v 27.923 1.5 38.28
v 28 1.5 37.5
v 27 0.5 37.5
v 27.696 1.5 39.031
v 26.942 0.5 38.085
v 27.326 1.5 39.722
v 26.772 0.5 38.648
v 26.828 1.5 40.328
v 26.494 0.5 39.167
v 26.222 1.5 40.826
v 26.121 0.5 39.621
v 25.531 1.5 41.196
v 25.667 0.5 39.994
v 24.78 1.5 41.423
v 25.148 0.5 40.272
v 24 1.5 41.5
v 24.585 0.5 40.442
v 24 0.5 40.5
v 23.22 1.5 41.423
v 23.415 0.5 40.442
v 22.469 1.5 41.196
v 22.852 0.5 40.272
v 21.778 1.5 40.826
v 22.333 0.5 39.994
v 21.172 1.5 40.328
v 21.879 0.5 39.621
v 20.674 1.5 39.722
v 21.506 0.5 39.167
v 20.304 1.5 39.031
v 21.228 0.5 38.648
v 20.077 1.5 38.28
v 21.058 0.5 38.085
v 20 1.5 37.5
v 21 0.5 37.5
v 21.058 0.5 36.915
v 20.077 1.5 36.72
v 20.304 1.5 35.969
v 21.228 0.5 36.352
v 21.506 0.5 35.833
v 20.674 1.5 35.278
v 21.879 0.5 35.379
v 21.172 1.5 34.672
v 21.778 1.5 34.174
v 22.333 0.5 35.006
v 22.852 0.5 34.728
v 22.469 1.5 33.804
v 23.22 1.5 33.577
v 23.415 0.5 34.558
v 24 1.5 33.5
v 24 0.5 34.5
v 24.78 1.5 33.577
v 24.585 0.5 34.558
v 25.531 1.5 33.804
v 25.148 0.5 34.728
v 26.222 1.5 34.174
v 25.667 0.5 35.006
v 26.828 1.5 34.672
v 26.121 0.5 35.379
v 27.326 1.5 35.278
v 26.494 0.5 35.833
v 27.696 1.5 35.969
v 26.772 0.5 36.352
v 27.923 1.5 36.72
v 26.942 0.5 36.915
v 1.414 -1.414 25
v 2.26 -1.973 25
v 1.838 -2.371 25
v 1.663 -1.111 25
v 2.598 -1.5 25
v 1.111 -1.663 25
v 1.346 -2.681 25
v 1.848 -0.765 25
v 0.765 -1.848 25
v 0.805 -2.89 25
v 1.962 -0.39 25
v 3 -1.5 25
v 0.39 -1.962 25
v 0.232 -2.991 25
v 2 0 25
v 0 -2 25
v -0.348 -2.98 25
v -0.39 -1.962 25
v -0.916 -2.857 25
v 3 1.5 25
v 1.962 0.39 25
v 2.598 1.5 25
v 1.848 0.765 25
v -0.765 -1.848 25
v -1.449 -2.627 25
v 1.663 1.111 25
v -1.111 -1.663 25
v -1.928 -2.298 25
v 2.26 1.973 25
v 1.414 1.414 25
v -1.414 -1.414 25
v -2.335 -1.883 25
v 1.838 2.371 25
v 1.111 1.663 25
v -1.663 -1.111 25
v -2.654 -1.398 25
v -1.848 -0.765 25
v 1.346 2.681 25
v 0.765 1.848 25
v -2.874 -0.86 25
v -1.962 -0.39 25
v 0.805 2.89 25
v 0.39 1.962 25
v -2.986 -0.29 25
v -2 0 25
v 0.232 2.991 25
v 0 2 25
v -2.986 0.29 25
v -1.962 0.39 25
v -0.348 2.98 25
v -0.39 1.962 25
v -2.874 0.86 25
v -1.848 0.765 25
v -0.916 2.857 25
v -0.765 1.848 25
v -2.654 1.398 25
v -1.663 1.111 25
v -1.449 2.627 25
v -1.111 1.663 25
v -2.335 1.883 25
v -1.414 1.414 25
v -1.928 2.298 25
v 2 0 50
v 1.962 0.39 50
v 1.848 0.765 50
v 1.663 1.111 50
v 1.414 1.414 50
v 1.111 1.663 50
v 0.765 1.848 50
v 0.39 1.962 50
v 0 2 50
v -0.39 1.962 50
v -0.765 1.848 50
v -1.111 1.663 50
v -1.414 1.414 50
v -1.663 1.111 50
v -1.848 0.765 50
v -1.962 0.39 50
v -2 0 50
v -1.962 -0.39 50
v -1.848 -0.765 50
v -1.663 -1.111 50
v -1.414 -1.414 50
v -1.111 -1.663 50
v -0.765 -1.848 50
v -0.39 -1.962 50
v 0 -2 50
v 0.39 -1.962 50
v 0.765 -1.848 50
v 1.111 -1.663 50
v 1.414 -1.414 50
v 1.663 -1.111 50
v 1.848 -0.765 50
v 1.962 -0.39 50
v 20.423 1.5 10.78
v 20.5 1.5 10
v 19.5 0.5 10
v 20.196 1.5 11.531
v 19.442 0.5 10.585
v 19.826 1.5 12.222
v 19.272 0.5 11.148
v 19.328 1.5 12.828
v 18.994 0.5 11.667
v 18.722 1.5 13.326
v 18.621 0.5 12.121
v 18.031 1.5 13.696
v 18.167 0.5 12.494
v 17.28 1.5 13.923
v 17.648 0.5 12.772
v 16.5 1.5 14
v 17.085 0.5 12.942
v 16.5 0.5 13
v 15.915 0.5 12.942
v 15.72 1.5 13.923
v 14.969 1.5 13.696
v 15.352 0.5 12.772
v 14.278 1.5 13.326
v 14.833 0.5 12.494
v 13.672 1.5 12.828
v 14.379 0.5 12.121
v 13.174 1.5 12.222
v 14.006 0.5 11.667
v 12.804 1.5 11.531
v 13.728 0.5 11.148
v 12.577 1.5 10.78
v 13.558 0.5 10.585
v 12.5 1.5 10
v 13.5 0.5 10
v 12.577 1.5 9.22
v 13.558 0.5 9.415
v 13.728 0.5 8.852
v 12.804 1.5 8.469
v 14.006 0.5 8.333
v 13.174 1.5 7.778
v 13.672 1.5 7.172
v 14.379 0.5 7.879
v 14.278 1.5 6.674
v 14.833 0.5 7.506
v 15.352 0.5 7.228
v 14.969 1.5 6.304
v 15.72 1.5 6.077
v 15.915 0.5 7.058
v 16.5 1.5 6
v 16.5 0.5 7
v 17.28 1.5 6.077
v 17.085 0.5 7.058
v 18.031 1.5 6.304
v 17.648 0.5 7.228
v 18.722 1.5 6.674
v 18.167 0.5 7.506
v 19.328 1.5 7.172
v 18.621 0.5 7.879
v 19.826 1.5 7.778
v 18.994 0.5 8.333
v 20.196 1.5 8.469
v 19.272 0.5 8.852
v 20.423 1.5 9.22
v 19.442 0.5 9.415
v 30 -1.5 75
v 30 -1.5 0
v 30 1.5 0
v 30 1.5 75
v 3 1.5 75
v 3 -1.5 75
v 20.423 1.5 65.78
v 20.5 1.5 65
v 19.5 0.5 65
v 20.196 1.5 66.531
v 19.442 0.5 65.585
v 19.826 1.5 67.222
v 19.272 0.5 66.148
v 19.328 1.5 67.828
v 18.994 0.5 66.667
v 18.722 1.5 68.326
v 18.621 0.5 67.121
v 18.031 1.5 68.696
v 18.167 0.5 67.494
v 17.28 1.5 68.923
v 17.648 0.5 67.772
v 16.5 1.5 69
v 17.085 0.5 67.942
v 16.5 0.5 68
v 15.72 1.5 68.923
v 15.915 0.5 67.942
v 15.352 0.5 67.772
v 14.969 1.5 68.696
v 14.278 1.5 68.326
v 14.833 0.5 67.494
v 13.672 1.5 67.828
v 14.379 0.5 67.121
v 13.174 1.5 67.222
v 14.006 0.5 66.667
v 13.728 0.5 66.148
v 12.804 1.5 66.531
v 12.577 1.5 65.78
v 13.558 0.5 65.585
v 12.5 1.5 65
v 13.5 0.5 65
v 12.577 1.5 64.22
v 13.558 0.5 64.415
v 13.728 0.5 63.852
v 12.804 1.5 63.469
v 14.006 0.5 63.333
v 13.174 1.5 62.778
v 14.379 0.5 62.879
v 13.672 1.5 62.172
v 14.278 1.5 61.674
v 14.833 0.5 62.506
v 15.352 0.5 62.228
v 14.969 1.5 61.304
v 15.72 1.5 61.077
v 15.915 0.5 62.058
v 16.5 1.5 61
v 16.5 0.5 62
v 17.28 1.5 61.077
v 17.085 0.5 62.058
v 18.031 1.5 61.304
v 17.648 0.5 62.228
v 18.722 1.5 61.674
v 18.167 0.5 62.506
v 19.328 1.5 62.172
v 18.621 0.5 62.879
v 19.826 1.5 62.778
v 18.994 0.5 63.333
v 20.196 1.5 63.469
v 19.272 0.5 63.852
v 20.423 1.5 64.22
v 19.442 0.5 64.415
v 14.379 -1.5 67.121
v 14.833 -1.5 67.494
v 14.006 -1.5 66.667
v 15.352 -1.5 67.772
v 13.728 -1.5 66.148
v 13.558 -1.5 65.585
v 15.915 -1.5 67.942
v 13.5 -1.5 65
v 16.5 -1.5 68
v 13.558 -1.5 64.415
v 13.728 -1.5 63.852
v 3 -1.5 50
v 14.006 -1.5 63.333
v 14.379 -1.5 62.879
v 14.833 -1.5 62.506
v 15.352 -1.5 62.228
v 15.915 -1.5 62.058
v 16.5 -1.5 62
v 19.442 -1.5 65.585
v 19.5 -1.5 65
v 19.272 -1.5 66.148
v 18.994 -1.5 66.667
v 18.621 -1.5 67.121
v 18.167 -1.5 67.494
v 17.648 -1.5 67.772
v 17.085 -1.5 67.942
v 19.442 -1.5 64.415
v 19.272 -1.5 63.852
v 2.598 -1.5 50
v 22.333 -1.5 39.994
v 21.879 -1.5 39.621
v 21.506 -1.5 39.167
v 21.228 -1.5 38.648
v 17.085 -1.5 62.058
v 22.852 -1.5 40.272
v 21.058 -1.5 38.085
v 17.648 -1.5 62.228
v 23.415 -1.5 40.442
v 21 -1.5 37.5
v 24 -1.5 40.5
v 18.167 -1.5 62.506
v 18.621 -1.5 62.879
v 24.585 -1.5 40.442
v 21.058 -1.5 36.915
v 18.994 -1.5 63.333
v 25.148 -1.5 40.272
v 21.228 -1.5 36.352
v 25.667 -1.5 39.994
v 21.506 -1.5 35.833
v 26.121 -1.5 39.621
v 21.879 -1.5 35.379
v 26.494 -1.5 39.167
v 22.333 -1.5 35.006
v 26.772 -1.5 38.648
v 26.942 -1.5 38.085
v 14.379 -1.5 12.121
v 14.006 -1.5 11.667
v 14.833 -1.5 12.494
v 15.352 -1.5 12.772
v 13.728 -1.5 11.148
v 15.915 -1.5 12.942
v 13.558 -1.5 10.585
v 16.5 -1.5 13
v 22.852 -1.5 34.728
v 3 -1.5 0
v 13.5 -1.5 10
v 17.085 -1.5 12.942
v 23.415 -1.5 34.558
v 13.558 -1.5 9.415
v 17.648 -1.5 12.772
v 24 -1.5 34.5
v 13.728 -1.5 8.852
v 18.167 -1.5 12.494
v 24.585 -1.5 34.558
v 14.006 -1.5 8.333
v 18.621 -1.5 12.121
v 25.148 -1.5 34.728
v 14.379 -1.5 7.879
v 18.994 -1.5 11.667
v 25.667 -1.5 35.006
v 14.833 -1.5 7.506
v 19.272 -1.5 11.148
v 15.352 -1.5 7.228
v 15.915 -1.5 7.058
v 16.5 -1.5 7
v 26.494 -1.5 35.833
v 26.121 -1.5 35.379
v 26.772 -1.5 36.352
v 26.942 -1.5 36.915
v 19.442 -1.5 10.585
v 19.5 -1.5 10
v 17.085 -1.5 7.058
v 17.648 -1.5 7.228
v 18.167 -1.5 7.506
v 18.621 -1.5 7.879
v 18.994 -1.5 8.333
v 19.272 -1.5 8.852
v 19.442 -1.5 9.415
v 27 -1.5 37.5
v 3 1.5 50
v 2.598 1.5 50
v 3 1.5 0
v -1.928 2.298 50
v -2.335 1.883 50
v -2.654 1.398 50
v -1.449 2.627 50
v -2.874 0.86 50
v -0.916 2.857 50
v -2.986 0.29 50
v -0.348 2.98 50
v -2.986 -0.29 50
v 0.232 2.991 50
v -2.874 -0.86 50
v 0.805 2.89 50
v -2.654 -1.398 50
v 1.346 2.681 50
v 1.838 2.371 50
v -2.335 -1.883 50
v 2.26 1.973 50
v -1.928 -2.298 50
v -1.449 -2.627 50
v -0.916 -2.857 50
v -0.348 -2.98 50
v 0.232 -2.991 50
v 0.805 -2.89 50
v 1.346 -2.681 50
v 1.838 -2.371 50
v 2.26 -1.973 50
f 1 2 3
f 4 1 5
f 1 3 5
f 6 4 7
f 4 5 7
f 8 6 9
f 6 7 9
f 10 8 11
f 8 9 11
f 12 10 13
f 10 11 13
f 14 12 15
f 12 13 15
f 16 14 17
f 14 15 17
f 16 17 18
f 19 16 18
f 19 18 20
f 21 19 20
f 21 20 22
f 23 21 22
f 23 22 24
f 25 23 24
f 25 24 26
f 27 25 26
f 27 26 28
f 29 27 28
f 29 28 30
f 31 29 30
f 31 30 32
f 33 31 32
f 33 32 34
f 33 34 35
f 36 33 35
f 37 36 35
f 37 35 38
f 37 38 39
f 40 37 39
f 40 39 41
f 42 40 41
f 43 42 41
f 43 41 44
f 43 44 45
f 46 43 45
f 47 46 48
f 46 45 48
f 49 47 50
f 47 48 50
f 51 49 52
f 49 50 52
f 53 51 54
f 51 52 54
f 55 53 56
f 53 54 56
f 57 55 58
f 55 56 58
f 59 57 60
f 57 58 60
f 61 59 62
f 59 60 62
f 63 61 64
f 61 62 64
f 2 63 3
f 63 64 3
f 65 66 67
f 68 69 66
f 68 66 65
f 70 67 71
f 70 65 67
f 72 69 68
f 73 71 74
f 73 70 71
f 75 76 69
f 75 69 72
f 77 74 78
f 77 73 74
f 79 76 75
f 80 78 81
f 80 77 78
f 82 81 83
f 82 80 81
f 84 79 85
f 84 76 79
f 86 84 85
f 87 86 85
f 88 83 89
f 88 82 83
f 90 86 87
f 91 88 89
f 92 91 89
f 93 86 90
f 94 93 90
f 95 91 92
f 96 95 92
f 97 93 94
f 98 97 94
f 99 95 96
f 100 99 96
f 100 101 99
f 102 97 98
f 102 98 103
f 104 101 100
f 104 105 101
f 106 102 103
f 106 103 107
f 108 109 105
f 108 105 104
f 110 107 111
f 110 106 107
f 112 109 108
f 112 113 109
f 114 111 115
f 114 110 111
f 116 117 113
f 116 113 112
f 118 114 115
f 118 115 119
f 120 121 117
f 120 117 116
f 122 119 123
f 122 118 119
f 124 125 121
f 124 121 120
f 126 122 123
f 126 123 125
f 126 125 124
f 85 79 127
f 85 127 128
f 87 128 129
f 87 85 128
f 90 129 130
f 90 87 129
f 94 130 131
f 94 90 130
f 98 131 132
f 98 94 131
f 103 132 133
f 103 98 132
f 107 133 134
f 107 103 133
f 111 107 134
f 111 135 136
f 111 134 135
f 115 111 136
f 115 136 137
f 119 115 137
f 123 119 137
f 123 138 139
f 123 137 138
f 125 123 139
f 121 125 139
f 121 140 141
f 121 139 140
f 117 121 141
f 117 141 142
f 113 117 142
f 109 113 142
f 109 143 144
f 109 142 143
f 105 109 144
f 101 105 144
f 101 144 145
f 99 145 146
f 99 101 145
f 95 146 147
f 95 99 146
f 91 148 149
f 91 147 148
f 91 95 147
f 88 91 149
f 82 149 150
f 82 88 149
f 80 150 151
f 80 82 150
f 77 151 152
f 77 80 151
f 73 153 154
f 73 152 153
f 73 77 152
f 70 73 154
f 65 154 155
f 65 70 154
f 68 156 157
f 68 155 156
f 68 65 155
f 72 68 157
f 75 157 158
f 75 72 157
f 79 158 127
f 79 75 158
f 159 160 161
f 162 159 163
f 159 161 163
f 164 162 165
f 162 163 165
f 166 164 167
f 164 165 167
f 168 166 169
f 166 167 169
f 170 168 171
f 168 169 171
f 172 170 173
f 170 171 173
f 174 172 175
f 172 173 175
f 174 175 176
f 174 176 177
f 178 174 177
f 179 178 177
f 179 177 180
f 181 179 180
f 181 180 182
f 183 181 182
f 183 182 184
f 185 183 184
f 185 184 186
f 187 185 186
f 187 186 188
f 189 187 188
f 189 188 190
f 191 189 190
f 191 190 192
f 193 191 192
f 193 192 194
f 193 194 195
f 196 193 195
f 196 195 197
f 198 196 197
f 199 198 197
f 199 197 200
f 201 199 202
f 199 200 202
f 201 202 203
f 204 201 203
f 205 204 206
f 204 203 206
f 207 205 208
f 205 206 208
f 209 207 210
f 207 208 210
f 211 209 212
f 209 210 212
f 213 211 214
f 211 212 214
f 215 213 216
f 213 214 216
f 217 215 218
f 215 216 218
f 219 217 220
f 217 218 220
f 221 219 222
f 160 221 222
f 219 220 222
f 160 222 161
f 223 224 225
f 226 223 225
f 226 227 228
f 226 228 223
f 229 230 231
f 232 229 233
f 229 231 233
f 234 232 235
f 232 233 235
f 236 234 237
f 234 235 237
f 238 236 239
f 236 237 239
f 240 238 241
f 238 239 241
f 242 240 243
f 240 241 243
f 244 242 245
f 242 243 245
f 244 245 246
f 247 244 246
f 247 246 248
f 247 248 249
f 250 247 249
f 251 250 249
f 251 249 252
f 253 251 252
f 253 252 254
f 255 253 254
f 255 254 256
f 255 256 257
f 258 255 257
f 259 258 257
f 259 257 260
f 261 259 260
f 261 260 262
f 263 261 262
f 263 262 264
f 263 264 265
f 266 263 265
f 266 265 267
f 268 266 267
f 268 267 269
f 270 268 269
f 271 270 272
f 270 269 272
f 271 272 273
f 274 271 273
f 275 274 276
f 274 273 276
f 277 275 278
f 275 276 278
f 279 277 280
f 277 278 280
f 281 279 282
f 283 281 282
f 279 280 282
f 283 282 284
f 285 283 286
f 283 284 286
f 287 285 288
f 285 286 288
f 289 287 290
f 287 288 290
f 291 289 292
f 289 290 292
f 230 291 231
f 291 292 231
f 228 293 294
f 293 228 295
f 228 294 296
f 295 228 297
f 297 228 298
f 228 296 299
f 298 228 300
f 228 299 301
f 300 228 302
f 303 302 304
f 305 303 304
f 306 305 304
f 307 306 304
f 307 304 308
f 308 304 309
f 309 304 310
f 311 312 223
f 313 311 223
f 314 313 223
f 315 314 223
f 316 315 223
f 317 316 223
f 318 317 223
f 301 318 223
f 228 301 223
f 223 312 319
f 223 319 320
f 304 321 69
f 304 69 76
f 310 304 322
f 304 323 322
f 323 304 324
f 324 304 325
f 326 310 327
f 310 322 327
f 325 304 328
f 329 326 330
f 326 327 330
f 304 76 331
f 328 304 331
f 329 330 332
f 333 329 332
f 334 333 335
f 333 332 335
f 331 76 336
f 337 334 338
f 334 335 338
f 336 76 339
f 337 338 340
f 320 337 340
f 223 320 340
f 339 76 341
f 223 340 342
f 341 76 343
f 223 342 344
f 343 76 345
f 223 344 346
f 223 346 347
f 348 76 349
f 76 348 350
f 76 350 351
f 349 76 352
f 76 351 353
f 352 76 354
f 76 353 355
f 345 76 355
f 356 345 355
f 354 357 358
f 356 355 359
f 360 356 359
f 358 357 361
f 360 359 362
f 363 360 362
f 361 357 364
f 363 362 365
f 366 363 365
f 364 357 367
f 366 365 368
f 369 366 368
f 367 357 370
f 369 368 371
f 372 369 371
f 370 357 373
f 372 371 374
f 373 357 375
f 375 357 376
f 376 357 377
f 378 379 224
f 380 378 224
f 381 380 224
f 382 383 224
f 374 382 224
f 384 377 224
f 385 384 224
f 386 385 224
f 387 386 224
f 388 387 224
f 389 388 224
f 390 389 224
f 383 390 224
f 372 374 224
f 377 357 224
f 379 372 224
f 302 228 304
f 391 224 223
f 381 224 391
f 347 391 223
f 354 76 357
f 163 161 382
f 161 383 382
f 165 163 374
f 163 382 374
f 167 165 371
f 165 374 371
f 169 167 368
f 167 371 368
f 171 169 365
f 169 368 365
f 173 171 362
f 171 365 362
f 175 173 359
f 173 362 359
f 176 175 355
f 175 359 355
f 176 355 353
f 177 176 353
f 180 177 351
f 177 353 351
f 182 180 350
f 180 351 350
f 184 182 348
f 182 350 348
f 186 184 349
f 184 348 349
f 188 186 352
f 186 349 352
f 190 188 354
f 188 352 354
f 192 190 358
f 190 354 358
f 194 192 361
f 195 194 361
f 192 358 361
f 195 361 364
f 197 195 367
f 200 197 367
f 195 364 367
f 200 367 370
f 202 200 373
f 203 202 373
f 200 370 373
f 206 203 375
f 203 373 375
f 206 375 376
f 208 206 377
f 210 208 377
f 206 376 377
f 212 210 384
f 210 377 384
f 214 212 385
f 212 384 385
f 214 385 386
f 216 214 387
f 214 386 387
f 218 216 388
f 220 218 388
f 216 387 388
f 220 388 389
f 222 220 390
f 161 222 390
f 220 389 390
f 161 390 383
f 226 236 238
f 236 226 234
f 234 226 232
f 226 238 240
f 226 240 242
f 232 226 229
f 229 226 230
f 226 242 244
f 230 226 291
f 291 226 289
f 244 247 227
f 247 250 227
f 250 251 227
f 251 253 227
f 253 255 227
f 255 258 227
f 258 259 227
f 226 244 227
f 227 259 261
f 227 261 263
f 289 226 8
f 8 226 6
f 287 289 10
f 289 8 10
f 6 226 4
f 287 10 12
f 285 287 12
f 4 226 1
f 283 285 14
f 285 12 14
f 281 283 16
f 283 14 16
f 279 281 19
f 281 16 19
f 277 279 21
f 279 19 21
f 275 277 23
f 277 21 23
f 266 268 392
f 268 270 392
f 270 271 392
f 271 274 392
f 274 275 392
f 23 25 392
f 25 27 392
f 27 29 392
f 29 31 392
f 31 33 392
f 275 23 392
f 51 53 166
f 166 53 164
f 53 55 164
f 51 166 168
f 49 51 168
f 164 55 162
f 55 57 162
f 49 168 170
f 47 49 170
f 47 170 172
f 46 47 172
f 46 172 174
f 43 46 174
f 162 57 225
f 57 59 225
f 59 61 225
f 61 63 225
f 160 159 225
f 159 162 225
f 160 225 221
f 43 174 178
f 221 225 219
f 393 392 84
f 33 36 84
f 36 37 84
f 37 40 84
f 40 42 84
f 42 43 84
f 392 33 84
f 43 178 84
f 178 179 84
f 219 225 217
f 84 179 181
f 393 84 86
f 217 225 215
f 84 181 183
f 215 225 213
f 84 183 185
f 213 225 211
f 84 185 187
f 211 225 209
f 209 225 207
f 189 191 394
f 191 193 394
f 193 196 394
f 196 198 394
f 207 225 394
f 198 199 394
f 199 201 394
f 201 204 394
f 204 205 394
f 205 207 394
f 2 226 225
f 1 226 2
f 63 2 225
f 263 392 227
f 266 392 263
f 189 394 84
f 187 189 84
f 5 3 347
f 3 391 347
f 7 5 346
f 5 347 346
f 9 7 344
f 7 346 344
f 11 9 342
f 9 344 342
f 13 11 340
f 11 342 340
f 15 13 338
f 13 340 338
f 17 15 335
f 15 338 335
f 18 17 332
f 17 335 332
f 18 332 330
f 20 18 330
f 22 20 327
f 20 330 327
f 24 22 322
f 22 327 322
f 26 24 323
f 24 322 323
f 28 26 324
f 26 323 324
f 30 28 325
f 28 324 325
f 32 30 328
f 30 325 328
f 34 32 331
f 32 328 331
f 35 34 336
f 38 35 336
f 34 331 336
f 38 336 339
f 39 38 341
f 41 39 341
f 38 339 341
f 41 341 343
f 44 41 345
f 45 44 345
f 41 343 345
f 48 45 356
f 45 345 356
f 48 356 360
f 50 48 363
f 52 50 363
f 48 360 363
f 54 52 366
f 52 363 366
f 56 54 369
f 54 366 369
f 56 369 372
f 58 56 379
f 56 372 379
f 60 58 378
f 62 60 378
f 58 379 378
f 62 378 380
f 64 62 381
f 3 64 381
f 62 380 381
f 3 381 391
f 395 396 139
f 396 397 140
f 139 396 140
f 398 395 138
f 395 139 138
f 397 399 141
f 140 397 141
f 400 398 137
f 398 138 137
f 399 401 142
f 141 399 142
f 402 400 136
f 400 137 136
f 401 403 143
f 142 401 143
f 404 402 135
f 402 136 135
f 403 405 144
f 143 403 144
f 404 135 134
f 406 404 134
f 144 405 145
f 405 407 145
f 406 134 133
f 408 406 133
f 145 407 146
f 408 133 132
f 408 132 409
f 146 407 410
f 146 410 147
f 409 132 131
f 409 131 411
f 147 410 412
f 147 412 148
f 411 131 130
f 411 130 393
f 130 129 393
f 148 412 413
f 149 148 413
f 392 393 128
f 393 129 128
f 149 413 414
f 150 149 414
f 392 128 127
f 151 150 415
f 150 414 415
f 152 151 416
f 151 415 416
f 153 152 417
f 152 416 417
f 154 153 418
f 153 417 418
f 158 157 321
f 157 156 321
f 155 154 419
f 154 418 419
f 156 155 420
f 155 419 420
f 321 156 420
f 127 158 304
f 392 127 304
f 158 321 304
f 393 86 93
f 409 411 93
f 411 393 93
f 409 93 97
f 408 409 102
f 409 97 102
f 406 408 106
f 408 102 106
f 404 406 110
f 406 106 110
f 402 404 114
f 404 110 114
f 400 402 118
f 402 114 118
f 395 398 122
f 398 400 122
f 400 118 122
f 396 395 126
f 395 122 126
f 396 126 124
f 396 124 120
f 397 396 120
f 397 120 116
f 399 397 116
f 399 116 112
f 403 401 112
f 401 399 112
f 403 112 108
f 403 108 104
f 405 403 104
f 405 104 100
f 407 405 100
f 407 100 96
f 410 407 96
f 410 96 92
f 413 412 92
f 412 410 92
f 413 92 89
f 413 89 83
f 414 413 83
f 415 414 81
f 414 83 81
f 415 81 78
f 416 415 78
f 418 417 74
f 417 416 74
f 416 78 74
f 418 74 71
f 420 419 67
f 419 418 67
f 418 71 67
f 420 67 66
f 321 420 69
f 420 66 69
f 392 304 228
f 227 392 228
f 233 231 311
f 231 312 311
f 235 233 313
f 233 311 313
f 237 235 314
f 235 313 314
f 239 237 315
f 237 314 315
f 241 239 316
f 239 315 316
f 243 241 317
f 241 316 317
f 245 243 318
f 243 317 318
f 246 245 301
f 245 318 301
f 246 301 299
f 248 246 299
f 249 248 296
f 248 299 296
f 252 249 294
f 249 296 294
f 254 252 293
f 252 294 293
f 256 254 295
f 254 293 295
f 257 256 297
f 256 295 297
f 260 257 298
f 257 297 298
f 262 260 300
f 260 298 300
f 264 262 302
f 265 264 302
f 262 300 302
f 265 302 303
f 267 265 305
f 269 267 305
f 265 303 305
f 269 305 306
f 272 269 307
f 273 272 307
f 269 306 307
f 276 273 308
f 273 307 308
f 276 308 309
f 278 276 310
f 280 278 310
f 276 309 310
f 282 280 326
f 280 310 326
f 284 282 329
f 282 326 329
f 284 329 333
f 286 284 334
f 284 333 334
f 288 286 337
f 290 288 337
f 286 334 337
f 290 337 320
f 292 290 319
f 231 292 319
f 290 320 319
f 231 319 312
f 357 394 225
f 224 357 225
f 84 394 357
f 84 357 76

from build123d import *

# Parameters (mm, degrees)
F0_R           = 2
F1_DEPTH       = 75
F2_W           = 3
F2_H           = 25
F3_DEPTH       = 12.5
F5_D           = 6
F5_CSINK_D     = 8
F5_CSINK_ANGLE = 90


with BuildPart() as f1:
    # F0 (on Top) → F1 (new body)
    with BuildSketch(Plane.XY):
        with BuildLine():
            Line((30, 1.5), (2.5980762114, 1.5))
            ThreePointArc((2.5980762114, 1.5), (-3, 0), (2.5980762114, -1.5))
            Line((2.5980762114, -1.5), (30, -1.5))
            Line((30, -1.5), (30, 1.5))
        make_face()
        Circle(F0_R, mode=Mode.SUBTRACT)
    extrude(amount=F1_DEPTH)

    # F2 (on Front) → F3 (cut, symmetric)
    with BuildSketch(Plane.XZ):
        with Locations((-1.5, 12.5)):
            Rectangle(F2_W, F2_H)
        with Locations((1.5, 12.5)):
            Rectangle(F2_W, F2_H)
        with Locations((-1.5, 62.5)):
            Rectangle(F2_W, F2_H)
        with Locations((1.5, 62.5)):
            Rectangle(F2_W, F2_H)
    extrude(amount=F3_DEPTH, both=True, mode=Mode.SUBTRACT)

    # F5 (through all)
    with Locations(Plane(origin=(0, 1.5, 0), x_dir=(-1, 0, 0), z_dir=(0, 1, 0))):
        with Locations((-16.5, 65), (-24, 37.5), (-16.5, 10)):
            CounterSinkHole(F5_D / 2, F5_CSINK_D / 2, counter_sink_angle=F5_CSINK_ANGLE)


solid = f1.part
